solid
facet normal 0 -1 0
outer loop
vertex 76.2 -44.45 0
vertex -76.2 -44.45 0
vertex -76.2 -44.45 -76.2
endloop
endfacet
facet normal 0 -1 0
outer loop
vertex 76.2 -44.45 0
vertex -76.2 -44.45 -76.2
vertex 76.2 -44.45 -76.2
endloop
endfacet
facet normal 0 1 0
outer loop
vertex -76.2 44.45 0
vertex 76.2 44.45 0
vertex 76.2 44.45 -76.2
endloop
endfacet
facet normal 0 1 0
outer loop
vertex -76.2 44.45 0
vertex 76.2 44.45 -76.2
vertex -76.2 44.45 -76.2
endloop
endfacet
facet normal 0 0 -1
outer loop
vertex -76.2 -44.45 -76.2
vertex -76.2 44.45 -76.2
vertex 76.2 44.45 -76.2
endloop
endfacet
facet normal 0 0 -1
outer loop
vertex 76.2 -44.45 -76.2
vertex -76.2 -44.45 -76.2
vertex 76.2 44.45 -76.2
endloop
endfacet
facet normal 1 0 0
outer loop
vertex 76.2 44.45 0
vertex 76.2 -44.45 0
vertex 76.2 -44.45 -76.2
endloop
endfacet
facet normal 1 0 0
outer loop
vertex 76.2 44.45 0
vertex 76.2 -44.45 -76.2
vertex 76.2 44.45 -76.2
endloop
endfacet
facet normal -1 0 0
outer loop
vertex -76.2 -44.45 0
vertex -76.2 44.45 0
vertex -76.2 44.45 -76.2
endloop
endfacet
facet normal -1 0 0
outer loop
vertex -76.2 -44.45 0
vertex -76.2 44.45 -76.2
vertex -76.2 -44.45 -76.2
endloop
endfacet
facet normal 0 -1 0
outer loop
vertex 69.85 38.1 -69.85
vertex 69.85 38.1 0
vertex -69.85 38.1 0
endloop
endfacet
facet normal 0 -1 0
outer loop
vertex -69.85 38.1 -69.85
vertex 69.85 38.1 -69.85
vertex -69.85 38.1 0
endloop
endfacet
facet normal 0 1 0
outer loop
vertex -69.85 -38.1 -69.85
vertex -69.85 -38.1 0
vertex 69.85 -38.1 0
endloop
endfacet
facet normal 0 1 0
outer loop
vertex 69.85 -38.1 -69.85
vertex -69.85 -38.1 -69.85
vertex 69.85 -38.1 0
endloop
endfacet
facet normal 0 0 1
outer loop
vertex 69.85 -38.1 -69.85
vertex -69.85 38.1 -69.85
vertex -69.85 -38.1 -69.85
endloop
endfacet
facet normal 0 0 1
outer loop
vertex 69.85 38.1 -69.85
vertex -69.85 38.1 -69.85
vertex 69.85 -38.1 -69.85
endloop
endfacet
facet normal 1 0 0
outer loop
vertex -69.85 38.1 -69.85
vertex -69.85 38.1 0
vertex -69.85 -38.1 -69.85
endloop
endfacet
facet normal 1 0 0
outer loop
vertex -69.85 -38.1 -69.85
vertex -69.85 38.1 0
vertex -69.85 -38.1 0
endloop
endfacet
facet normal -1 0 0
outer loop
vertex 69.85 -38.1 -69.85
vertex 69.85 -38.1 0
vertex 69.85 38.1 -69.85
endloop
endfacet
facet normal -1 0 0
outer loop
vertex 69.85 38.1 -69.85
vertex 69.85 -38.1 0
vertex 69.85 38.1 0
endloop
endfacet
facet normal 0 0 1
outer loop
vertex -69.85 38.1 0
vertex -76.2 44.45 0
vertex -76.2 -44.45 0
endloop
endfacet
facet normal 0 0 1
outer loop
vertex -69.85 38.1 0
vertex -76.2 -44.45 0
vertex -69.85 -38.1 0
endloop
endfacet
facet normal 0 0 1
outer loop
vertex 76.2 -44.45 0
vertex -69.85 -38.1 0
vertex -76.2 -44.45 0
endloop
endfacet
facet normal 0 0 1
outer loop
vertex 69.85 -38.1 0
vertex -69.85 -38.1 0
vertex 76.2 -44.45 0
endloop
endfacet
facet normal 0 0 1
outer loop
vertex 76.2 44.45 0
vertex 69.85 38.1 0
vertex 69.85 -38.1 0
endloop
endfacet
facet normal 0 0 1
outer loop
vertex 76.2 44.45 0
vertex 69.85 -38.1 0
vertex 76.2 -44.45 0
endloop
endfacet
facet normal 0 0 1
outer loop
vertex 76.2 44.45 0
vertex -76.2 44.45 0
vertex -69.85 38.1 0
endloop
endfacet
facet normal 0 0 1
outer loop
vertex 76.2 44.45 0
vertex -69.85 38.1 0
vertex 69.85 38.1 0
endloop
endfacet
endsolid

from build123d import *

# Parameters (mm, degrees)
F1_DEPTH = 76.2
F2_DEPTH = 69.85


with BuildPart() as f1:
    # F0 (on Top) → F1 (new body)
    with BuildSketch(Plane.XY):
        Polygon((-69.85, -38.1), (0, -38.1), (69.85, -38.1), (69.85, 38.1), (0, 38.1), (-69.85, 38.1), align=None)
        Polygon((-76.2, -44.45), (0, -44.45), (0, -38.1), (-69.85, -38.1), (-69.85, 38.1), (0, 38.1), (0, 44.45), (-76.2, 44.45), align=None)
        Polygon((0, -44.45), (76.2, -44.45), (76.2, 44.45), (0, 44.45), (0, 38.1), (69.85, 38.1), (69.85, -38.1), (0, -38.1), align=None)
    extrude(amount=-F1_DEPTH)

    # F0 (on Top) → F2 (cut)
    with BuildSketch(Plane.XY):
        Polygon((-69.85, -38.1), (0, -38.1), (69.85, -38.1), (69.85, 38.1), (0, 38.1), (-69.85, 38.1), align=None)
    extrude(amount=-F2_DEPTH, mode=Mode.SUBTRACT)


solid = f1.part
